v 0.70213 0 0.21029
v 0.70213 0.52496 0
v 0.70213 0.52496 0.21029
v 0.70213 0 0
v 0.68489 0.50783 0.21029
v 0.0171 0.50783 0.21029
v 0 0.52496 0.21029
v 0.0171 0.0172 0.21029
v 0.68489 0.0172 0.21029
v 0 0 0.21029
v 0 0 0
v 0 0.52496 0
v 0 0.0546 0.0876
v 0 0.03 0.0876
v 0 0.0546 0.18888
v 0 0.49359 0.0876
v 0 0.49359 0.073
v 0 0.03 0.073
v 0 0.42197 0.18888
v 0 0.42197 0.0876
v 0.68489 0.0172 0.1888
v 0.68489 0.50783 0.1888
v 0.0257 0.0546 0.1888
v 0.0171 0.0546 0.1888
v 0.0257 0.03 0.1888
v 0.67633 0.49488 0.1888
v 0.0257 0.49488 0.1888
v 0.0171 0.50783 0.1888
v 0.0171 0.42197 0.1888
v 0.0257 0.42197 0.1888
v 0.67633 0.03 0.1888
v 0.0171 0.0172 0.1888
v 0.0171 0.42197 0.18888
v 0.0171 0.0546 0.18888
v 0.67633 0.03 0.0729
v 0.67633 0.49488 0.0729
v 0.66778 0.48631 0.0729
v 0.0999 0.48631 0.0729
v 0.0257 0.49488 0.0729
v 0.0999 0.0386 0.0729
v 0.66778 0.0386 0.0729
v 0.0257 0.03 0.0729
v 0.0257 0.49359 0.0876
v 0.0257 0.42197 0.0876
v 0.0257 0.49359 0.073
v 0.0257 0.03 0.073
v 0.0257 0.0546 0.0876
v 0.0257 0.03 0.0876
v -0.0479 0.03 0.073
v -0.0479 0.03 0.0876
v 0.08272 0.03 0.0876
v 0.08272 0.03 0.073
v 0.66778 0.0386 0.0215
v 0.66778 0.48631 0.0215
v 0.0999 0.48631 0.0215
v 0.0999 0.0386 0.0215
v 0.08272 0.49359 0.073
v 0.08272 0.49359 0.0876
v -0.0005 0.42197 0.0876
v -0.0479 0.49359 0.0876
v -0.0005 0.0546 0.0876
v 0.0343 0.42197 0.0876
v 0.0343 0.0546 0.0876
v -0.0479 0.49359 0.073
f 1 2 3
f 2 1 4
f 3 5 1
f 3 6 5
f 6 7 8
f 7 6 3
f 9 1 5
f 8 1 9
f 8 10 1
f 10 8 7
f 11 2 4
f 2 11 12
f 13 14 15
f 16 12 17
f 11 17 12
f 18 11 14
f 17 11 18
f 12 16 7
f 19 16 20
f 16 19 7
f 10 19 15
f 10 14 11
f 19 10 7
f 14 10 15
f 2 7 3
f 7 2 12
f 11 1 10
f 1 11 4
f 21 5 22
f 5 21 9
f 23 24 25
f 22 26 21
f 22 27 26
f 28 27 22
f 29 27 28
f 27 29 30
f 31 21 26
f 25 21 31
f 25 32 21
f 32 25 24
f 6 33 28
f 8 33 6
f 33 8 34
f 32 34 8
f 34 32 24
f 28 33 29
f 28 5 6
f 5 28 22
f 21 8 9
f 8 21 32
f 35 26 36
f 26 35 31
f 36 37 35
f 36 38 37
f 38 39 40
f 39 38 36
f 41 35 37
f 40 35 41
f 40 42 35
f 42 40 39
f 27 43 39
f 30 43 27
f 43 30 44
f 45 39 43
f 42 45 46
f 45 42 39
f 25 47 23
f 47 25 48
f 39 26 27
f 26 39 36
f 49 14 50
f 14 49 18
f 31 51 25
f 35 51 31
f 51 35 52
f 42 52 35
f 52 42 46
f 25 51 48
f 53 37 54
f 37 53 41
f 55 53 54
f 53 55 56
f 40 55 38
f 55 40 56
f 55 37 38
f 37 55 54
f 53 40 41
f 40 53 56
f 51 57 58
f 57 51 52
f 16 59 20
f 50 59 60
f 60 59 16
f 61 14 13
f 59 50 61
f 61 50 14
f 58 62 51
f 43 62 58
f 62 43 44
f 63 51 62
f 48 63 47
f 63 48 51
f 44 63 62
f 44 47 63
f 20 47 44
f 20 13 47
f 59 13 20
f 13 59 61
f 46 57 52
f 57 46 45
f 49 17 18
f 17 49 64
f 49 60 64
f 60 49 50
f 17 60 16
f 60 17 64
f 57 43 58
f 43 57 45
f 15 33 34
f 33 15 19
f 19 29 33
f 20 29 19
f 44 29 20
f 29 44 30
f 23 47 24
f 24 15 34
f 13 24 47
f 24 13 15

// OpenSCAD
// ============================================================
// Parametric plate with stepped top pocket, lower pocket,
// side projection tab and side recess
// ============================================================

$fn = 64;
eps = 0.0005;                  // small overlap for clean booleans

// ---------- Main reference body ----------
body_len  = 0.702127;          // X
body_wid  = 0.524964;          // Y
body_hgt  = 0.210295;          // Z (main height 0.2103)

// ---------- Upper shallow recess (top opening) ----------
r1_len    = 0.667793;
r1_wid    = 0.490631;
r1_x      = 0.0171;            // inset from left edge
r1_y      = 0.0172;            // inset from front edge
r1_z0     = 0.1888;            // band bottom above underside
r1_depth  = 0.0215;            // -> up to 0.2103

// ---------- Continuation of the top opening (deep pocket) ----------
r2_len    = 0.650626;
r2_wid    = 0.464880;
r2_x      = 0.0257;
r2_y      = 0.0300;
r2_z0     = 0.0729;
r2_depth  = 0.1159;            // -> up to 0.1888

// ---------- Lower offset pocket ----------
r3_len    = 0.567882;
r3_wid    = 0.447713;
r3_x      = 0.0999;
r3_y      = 0.0386;
r3_z0     = 0.0215;            // leaves 0.0215 bottom thickness
r3_depth  = 0.0515;            // -> up to 0.0730

// ---------- Side projection (solid tab) ----------
tab_len   = 0.130618;
tab_wid   = 0.463588;
tab_x     = -0.0479;           // overhangs the left length edge
tab_y     = 0.0300;
tab_z0    = 0.0730;
tab_thk   = 0.0146;            // -> up to 0.0876

// ---------- Side recess (cut at left edge) ----------
sr_depth  = 0.0343;            // X extent measured from left face
sr_len    = 0.367372;          // along Y
sr_y      = 0.0546;            // from front edge
sr_z0     = 0.0876;
sr_hgt    = 0.101285;          // -> up to 0.1889

// ------------------------------------------------------------
// Helper: axis aligned box placed by its minimum corner
// ------------------------------------------------------------
module box_at(pos, size) {
    translate(pos) cube(size);
}

// ------------------------------------------------------------
// Step 1: solid base block with the three stacked pockets
// ------------------------------------------------------------
module base_with_pockets() {
    difference() {
        // Main rectangular solid
        cube([body_len, body_wid, body_hgt]);

        // Shallow top recess (open to the top face)
        box_at([r1_x, r1_y, r1_z0],
               [r1_len, r1_wid, r1_depth + eps]);

        // Deep continuation of the top opening
        box_at([r2_x, r2_y, r2_z0],
               [r2_len, r2_wid, r2_depth + eps]);

        // Lower, more offset pocket
        box_at([r3_x, r3_y, r3_z0],
               [r3_len, r3_wid, r3_depth + eps]);
    }
}

// ------------------------------------------------------------
// Step 2: side projection added in the lower band
// ------------------------------------------------------------
module side_projection() {
    box_at([tab_x, tab_y, tab_z0],
           [tab_len, tab_wid, tab_thk]);
}

// ------------------------------------------------------------
// Step 3: side recess cut at the left edge (not through)
// ------------------------------------------------------------
module side_recess() {
    box_at([-eps, sr_y, sr_z0],
           [sr_depth + eps, sr_len, sr_hgt]);
}

// ------------------------------------------------------------
// Final model
// ------------------------------------------------------------
difference() {
    union() {
        base_with_pockets();
        side_projection();
    }
    side_recess();
}
